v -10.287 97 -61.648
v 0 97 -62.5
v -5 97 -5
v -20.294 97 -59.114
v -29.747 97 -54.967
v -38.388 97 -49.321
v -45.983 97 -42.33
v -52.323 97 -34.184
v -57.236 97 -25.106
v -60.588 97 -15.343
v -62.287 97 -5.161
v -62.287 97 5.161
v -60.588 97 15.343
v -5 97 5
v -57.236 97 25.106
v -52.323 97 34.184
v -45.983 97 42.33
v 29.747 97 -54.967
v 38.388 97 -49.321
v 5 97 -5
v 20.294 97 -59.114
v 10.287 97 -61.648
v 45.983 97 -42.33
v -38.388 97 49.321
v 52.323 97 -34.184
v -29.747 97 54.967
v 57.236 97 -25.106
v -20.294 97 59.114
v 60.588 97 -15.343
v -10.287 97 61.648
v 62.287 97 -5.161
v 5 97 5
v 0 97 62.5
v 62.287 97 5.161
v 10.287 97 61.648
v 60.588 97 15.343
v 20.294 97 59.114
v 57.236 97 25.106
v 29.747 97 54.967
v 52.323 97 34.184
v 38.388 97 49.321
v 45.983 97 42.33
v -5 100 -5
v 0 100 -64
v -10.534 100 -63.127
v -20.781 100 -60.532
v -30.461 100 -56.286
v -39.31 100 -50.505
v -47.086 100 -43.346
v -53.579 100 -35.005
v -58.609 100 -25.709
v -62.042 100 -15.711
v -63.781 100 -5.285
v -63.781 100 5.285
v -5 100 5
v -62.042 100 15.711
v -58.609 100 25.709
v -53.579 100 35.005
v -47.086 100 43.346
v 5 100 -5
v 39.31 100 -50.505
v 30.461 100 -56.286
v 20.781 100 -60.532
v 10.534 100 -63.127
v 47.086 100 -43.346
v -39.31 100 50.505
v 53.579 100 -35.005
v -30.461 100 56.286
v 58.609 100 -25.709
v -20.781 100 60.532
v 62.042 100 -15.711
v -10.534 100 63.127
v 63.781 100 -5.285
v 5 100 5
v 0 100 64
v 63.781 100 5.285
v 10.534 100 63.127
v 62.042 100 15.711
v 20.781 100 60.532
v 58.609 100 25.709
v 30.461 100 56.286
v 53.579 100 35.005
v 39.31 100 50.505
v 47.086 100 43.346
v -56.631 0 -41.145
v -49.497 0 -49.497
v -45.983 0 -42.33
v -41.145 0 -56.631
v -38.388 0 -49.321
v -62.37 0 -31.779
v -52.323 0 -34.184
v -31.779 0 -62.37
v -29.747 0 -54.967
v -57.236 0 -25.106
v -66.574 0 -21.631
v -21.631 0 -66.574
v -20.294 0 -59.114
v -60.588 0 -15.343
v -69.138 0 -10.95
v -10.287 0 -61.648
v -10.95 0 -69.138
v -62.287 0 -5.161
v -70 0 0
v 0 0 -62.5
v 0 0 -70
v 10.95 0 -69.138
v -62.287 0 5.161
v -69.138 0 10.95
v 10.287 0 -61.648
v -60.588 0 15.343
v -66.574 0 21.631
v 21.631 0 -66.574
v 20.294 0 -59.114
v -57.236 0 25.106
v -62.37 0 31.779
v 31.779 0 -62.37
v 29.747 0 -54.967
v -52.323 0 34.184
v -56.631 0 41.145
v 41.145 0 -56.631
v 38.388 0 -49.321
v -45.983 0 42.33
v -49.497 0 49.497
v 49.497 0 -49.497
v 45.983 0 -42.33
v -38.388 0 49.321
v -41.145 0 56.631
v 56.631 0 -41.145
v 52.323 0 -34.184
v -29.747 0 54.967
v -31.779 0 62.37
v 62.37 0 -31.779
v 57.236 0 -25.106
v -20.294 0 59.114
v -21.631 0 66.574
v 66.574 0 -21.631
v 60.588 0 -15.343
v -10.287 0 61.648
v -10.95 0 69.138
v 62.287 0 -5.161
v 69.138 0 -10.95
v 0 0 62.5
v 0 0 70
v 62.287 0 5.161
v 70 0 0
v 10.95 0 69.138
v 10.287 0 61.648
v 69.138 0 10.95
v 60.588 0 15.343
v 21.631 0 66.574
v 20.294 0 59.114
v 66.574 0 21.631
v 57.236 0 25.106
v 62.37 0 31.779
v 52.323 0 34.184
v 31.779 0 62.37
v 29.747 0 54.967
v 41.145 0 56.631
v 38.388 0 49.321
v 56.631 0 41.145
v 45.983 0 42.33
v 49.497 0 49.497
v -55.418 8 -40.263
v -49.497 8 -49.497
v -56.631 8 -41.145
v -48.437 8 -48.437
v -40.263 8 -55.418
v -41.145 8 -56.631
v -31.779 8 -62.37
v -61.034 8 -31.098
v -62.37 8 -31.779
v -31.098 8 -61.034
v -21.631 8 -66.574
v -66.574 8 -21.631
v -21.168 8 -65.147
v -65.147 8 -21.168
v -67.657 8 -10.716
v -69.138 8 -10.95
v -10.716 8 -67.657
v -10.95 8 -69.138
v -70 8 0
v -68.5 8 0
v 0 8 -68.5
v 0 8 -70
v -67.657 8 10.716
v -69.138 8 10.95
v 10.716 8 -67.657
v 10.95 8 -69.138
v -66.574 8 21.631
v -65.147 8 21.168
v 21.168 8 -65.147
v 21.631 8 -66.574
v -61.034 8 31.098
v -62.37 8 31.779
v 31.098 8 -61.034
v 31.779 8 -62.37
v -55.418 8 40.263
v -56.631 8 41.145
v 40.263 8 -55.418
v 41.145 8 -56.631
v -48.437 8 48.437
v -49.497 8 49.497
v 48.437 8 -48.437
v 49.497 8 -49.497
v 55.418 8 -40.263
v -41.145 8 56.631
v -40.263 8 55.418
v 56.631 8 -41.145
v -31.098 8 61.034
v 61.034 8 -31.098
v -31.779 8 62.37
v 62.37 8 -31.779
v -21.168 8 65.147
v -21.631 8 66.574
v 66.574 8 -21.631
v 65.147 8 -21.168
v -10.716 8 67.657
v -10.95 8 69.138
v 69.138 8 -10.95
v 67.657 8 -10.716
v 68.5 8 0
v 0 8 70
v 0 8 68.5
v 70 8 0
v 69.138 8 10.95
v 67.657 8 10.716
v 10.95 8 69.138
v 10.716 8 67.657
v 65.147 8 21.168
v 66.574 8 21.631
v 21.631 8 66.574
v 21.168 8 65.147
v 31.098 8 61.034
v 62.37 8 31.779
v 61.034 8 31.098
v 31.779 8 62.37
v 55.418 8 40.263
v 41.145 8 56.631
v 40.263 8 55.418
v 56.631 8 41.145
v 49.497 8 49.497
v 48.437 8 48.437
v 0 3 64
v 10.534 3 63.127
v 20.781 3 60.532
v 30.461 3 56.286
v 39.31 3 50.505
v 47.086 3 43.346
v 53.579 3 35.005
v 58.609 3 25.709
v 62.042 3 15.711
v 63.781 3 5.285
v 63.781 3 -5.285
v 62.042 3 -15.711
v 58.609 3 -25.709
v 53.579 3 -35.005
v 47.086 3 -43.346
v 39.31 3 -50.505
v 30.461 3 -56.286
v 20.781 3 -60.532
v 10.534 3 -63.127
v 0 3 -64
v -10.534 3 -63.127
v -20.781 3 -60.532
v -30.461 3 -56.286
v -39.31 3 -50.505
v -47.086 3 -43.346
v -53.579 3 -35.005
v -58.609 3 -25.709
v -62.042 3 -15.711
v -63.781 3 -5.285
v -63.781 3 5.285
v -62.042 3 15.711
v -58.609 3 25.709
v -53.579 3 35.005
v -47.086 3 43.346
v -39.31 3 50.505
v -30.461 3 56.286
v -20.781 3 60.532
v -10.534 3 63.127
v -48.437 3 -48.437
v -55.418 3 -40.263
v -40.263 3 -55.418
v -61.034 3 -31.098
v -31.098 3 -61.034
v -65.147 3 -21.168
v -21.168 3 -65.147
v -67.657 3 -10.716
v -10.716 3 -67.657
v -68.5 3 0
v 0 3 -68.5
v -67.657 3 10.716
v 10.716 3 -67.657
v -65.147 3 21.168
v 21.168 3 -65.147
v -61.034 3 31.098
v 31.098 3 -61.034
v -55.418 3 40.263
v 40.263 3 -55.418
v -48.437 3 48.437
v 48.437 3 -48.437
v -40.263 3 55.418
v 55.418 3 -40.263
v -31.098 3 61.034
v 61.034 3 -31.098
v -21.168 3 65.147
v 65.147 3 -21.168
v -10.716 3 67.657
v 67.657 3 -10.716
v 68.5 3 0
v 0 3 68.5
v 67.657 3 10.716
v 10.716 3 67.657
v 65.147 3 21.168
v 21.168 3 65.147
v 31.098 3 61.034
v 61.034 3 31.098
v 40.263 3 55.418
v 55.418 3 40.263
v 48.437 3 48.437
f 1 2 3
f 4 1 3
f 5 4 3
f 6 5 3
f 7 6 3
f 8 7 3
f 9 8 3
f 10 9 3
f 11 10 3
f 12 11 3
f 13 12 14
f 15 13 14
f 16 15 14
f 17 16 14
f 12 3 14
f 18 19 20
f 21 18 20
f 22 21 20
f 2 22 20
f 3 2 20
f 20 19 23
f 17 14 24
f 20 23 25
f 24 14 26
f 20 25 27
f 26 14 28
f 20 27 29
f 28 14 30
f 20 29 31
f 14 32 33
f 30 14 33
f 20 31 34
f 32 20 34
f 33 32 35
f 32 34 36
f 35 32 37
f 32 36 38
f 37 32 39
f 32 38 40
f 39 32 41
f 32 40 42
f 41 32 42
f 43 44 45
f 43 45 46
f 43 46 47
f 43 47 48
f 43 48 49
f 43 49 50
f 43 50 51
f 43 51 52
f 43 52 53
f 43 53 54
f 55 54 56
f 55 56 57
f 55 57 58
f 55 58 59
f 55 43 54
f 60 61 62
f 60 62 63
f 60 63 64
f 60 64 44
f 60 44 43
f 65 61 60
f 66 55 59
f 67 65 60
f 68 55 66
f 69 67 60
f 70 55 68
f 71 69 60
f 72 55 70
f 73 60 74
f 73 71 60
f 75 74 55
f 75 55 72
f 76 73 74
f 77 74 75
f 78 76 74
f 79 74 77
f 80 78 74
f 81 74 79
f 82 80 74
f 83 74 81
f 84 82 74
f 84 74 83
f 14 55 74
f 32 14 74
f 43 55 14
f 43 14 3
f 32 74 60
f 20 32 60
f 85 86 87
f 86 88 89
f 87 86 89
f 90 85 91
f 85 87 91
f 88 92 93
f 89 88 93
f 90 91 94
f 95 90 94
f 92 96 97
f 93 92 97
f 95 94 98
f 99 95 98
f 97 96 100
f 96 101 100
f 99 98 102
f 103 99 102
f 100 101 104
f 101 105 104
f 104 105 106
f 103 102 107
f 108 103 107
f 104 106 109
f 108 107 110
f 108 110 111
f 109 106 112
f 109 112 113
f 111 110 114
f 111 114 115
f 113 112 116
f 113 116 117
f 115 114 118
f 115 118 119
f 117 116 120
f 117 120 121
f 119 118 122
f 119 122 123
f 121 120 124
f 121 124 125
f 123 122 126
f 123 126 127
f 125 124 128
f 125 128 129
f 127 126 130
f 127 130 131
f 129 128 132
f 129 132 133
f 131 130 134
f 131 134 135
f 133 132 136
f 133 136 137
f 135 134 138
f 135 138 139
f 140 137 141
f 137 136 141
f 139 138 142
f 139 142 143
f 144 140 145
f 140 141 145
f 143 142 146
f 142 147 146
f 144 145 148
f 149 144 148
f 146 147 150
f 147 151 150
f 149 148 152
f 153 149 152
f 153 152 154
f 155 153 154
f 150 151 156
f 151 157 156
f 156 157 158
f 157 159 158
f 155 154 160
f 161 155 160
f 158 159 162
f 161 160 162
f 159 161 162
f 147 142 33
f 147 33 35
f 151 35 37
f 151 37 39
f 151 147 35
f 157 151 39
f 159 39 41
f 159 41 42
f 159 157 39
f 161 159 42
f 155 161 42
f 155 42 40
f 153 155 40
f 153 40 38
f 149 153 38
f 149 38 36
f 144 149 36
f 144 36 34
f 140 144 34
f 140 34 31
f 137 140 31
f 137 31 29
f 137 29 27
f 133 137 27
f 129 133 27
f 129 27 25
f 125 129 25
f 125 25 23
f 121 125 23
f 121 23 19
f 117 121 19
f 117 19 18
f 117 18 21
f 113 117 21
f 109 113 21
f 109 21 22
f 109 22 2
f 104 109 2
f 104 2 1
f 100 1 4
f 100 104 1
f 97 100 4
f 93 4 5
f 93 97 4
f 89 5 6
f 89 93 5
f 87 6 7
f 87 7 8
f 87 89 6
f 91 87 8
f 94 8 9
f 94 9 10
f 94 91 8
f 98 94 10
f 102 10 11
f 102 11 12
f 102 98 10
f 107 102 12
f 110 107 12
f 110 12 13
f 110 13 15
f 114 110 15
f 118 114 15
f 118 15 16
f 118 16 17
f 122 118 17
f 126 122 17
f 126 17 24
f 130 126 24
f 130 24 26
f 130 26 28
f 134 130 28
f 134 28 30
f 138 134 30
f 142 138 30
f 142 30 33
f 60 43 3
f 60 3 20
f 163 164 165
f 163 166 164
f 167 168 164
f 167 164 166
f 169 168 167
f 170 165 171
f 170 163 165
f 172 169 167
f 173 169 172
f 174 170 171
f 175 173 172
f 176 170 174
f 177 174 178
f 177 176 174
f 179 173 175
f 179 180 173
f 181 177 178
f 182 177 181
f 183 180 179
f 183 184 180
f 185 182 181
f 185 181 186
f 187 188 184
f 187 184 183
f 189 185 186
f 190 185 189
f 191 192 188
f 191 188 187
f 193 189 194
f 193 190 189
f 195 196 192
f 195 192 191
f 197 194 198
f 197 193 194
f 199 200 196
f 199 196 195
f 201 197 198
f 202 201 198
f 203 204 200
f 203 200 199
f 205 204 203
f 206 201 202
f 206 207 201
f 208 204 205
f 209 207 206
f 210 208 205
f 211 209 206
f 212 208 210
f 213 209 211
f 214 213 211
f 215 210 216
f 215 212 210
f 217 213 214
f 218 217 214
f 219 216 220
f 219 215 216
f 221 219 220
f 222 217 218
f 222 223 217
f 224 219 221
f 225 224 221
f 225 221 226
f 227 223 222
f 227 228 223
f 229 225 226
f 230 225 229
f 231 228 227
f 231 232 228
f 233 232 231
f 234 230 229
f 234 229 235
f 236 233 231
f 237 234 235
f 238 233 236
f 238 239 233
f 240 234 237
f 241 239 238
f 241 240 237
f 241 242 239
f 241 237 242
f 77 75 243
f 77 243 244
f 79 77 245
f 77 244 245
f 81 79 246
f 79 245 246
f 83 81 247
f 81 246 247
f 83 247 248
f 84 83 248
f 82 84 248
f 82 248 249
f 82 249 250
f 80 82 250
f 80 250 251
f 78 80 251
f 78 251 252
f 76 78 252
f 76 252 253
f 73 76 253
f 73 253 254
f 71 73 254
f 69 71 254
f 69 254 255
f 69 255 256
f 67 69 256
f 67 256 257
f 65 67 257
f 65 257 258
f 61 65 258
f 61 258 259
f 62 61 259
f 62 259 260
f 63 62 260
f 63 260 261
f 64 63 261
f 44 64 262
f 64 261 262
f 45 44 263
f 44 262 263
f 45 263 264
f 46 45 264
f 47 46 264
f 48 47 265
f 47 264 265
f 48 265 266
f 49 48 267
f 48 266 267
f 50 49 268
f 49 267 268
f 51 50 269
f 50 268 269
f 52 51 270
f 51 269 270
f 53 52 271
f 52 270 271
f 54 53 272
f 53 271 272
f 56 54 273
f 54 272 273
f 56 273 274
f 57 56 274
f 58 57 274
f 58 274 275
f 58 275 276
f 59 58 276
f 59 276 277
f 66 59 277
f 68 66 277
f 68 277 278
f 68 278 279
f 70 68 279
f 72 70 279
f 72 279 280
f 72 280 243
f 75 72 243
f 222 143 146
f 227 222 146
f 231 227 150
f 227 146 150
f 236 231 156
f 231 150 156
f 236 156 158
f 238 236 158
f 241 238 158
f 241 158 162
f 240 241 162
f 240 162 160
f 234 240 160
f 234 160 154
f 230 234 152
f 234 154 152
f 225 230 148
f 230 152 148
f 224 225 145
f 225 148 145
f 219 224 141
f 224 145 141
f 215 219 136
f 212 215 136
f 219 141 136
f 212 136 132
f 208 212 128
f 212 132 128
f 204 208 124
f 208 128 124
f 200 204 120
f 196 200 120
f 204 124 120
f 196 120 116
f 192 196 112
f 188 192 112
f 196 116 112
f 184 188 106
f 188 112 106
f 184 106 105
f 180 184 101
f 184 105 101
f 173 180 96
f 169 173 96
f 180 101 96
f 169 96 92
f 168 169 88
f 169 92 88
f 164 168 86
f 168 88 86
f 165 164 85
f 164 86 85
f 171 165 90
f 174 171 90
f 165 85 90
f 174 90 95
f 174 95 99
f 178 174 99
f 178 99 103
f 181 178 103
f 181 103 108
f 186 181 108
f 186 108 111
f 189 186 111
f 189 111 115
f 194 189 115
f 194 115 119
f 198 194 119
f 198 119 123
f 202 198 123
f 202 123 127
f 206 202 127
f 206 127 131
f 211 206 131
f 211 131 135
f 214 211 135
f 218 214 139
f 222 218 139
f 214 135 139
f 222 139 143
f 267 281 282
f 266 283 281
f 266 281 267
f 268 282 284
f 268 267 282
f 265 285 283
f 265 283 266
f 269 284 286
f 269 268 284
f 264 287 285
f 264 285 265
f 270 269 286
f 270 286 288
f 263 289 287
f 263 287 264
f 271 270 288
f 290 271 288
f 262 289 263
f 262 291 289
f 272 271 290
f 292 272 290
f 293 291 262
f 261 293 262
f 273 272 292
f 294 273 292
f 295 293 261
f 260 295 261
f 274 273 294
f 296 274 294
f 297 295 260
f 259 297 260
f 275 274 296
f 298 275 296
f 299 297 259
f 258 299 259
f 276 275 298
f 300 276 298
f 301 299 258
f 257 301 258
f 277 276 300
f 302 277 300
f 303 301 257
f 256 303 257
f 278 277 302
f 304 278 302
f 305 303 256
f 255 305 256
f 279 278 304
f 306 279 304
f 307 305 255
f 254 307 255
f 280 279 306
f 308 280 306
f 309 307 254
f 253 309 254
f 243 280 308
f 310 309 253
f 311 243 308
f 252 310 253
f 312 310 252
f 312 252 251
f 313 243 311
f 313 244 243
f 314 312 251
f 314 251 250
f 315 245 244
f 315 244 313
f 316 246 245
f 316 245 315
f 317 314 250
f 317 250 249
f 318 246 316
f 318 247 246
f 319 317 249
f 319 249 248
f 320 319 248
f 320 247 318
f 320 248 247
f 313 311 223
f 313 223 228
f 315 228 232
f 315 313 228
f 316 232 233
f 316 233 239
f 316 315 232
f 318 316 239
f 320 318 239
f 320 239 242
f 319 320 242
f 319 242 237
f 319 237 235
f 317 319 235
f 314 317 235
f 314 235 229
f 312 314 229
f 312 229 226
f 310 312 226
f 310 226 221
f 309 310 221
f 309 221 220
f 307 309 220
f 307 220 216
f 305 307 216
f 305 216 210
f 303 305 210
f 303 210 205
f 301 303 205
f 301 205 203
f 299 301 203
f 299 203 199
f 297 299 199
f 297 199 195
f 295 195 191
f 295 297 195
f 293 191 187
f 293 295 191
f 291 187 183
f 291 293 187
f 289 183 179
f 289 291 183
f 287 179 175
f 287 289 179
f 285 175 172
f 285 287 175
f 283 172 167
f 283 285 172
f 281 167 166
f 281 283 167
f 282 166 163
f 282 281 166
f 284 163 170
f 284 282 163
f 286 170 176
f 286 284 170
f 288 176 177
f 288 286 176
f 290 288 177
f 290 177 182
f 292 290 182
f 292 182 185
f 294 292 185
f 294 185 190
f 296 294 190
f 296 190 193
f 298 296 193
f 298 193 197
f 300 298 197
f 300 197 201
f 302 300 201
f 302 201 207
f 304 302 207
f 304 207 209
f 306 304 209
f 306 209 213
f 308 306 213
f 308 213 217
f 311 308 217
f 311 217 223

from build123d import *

# Parameters (mm, degrees)
SKETCH_1_R          = 70
SKETCH_1_R_2        = 68.5
EXTRUDE_1_DEPTH     = 8
SKETCH_2_R          = 68.5
SKETCH_2_R_2        = 64
EXTRUDE_2_DEPTH     = 3
SKETCH_3_R          = 64
SKETCH_3_R_2        = 62.5
EXTRUDE_3_DEPTH     = 100
EXTRUDE_START       = 97
SKETCH_4_R          = 62.5
EXTRUDE_4_DEPTH     = 3
SKETCH_5_W          = 10
SKETCH_5_H          = 10
CUT_EXTRUDE_1_DEPTH = 10


with BuildPart() as part:
    # 스케치1 → 보스-돌출1 (new body)
    with BuildSketch(Plane(origin=(0, 0, 0), x_dir=(1, 0, 0), z_dir=(0, 1, 0))):
        with Locations(Location((0, 0, 0), (0, 0, 270))):
            Circle(SKETCH_1_R)
        with Locations(Location((0, 0, 0), (0, 0, 270))):
            Circle(SKETCH_1_R_2, mode=Mode.SUBTRACT)
    extrude(amount=EXTRUDE_1_DEPTH)

    # 스케치2 → 보스-돌출2 (add)
    with BuildSketch(Plane(origin=(0, 0, 0), x_dir=(1, 0, 0), z_dir=(0, 1, 0))):
        with Locations(Location((0, 0, 0), (0, 0, 270))):
            Circle(SKETCH_2_R)
        with Locations(Location((0, 0, 0), (0, 0, 270))):
            Circle(SKETCH_2_R_2, mode=Mode.SUBTRACT)
    extrude(amount=EXTRUDE_2_DEPTH)

    # 스케치3 → 보스-돌출3 (add)
    with BuildSketch(Plane(origin=(0, 0, 0), x_dir=(1, 0, 0), z_dir=(0, 1, 0))):
        with Locations(Location((0, 0, 0), (0, 0, 270))):
            Circle(SKETCH_3_R)
        with Locations(Location((0, 0, 0), (0, 0, 270))):
            Circle(SKETCH_3_R_2, mode=Mode.SUBTRACT)
    extrude(amount=EXTRUDE_3_DEPTH)

    # 스케치4 → 보스-돌출4 (add)
    with BuildSketch(Plane(origin=(0, 0, 0), x_dir=(1, 0, 0), z_dir=(0, 1, 0)).offset(EXTRUDE_START)):
        with Locations(Location((0, 0, 0), (0, 0, 270))):
            Circle(SKETCH_4_R)
    extrude(amount=EXTRUDE_4_DEPTH)

    # 스케치5 → 컷-돌출1 (cut)
    with BuildSketch(Plane(origin=(0, 100, 0), x_dir=(1, 0, 0), z_dir=(0, 1, 0))):
        Rectangle(SKETCH_5_W, SKETCH_5_H)
    extrude(amount=-CUT_EXTRUDE_1_DEPTH, mode=Mode.SUBTRACT)


solid = part.part
